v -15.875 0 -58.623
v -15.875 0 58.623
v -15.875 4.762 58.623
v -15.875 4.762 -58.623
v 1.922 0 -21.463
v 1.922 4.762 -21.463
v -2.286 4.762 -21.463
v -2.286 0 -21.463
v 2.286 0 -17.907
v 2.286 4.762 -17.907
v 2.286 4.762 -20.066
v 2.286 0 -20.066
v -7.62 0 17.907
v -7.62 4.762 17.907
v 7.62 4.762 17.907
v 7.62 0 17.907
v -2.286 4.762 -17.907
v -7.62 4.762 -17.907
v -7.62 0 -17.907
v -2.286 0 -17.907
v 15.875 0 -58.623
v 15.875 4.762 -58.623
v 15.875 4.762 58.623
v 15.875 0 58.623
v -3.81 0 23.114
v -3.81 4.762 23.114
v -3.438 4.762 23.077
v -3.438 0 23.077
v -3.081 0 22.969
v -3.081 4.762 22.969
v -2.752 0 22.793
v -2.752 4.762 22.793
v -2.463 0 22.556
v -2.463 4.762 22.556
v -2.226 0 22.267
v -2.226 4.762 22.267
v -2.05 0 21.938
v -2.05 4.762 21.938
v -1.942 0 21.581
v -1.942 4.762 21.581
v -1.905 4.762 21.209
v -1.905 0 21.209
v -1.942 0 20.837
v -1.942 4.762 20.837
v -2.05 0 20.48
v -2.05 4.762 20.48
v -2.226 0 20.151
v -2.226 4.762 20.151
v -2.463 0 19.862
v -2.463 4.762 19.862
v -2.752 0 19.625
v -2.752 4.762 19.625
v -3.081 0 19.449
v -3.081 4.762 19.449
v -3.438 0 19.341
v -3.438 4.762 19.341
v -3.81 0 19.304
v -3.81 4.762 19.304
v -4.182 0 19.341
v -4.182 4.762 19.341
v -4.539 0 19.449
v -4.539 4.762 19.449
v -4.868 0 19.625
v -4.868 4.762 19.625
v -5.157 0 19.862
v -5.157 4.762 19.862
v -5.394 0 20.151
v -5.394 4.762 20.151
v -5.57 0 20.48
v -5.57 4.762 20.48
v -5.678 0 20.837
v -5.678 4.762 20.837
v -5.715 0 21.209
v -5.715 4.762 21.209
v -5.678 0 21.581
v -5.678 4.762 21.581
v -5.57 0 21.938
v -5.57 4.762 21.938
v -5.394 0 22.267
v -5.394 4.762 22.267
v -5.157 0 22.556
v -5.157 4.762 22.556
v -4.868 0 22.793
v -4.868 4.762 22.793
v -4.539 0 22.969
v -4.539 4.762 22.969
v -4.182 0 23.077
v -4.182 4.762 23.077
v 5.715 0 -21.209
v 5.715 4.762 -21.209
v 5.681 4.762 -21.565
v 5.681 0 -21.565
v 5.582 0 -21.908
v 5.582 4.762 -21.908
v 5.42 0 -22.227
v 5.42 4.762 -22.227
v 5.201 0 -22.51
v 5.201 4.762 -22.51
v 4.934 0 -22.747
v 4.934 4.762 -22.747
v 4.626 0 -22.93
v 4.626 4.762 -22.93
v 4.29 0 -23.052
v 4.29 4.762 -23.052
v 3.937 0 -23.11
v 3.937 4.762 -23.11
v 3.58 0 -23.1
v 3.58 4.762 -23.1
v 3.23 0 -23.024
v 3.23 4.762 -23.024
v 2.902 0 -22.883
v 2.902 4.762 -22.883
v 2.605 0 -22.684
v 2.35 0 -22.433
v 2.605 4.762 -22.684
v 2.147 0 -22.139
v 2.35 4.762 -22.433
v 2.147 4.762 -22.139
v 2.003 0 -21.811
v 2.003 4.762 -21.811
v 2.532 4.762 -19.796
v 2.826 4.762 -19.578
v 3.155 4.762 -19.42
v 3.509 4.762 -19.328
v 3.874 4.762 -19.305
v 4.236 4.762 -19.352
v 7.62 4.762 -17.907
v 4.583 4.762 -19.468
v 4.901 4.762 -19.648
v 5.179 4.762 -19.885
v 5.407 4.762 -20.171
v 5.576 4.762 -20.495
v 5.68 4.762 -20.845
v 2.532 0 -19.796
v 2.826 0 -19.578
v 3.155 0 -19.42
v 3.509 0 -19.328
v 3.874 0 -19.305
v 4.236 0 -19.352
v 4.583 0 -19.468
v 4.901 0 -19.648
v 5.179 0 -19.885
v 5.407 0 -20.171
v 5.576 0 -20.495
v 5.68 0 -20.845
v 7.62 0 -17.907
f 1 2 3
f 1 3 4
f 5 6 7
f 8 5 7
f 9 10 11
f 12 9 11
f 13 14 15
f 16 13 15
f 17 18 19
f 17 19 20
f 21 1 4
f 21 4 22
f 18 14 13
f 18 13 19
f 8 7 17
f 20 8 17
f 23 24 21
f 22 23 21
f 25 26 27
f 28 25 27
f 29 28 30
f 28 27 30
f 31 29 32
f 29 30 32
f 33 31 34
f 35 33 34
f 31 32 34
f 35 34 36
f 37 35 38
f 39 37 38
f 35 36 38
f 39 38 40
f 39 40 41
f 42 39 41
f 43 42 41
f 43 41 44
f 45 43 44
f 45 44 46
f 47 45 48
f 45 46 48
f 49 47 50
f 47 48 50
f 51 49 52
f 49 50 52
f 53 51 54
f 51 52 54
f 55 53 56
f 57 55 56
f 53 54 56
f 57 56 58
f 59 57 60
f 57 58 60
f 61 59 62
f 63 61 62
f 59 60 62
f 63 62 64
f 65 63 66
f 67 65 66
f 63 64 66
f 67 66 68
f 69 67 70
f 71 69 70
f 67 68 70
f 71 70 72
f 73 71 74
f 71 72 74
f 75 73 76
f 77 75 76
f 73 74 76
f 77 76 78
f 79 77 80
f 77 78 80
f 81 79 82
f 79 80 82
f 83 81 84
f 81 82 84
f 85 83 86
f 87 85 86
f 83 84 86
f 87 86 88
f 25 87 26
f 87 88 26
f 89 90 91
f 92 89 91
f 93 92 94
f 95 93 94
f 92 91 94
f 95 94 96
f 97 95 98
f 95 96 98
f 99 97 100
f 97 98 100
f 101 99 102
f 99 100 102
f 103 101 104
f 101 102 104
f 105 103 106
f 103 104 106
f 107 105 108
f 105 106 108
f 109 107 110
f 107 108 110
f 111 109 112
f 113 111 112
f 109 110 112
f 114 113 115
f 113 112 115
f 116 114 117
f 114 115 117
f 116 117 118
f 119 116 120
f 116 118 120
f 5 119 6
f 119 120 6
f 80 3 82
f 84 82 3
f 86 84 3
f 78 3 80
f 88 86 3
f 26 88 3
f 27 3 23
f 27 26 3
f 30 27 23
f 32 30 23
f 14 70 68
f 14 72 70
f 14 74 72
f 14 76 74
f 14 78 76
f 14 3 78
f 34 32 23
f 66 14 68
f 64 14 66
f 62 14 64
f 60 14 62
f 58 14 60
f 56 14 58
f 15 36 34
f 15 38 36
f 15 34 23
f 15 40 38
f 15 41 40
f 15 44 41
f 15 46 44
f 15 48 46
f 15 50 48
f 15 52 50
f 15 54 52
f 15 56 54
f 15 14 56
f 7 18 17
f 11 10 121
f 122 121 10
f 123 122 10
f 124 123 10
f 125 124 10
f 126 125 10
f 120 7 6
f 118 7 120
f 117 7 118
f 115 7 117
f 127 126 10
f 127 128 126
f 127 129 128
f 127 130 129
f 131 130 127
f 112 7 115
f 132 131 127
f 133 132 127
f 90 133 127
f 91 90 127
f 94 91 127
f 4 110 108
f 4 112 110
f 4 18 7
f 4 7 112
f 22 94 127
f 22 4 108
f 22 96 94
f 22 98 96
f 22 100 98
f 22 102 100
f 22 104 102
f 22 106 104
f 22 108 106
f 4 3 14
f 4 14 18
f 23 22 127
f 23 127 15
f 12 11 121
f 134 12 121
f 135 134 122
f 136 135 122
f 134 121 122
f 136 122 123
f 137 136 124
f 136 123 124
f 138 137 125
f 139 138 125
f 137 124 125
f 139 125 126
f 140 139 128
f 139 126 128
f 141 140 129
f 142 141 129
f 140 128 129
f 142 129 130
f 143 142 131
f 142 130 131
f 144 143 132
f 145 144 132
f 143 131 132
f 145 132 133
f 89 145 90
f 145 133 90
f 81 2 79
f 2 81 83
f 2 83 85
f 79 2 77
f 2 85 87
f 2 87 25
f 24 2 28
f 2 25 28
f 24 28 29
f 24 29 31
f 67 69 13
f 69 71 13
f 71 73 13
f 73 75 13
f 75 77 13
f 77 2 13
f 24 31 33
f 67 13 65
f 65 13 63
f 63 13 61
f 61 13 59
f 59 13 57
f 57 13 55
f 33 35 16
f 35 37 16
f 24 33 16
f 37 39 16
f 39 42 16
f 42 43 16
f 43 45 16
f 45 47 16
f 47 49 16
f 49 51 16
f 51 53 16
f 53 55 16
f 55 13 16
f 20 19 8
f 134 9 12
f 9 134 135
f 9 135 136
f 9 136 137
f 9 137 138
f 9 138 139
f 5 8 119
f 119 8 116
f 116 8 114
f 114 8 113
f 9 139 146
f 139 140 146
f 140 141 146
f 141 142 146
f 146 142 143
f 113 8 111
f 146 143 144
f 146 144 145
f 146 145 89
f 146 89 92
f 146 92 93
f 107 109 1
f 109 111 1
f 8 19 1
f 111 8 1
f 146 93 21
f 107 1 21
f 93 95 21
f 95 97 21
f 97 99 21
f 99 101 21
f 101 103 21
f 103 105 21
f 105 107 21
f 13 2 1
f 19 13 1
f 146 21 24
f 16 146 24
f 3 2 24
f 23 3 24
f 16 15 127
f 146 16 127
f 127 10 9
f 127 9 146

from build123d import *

# Parameters (mm, degrees)
SKETCH1_W           = 31.75
SKETCH1_H           = 117.2464
BOSS_EXTRUDE1_DEPTH = 4.7625
SKETCH3_W           = 15.24
SKETCH3_H           = 35.814
CUT_EXTRUDE1_DEPTH  = 4.7625
SKETCH4_R           = 1.905
CUT_EXTRUDE9_DEPTH  = 4.7625


with BuildPart() as part:
    # Sketch1 → Boss-Extrude1 (new body)
    with BuildSketch(Plane(origin=(0, 0, 0), x_dir=(1, 0, 0), z_dir=(0, 1, 0))):
        Rectangle(SKETCH1_W, SKETCH1_H)
    extrude(amount=BOSS_EXTRUDE1_DEPTH)

    # Sketch3 → Cut-Extrude1 (cut)
    with BuildSketch(Plane(origin=(0, 4.7625, 0), x_dir=(1, 0, 0), z_dir=(0, 1, 0))):
        Rectangle(SKETCH3_W, SKETCH3_H)
    extrude(amount=-CUT_EXTRUDE1_DEPTH, mode=Mode.SUBTRACT)

    # Sketch4 → Cut-Extrude9 (cut)
    with BuildSketch(Plane(origin=(0, 4.7625, 0), x_dir=(1, 0, 0), z_dir=(0, 1, 0))):
        with Locations(Location((-3.81, -21.209, 0), (0, 0, 270))):
            Circle(SKETCH4_R)
        with BuildLine():
            Line((-2.286, 21.463), (-2.286, 17.907))
            Line((-2.286, 17.907), (2.286, 17.907))
            Line((2.286, 17.907), (2.286, 20.066))
            ThreePointArc((2.286, 20.066), (1.966546058, 20.728684934), (1.922009269, 21.463))
            Line((1.922009269, 21.463), (-2.286, 21.463))
        make_face()
        with BuildLine():
            ThreePointArc((1.922009269, 21.463), (1.966546058, 20.728684934), (2.286, 20.066))
            Line((2.286, 20.066), (2.286, 21.463))
            Line((2.286, 21.463), (1.922009269, 21.463))
        make_face()
        with BuildLine():
            Line((2.286, 21.463), (2.286, 20.066))
            ThreePointArc((2.286, 20.066), (4.412413894, 19.401758317), (5.715, 21.209))
            ThreePointArc((5.715, 21.209), (3.937284441, 23.109742926), (1.922009269, 21.463))
            Line((1.922009269, 21.463), (2.286, 21.463))
        make_face()
    extrude(amount=-CUT_EXTRUDE9_DEPTH, mode=Mode.SUBTRACT)


solid = part.part
